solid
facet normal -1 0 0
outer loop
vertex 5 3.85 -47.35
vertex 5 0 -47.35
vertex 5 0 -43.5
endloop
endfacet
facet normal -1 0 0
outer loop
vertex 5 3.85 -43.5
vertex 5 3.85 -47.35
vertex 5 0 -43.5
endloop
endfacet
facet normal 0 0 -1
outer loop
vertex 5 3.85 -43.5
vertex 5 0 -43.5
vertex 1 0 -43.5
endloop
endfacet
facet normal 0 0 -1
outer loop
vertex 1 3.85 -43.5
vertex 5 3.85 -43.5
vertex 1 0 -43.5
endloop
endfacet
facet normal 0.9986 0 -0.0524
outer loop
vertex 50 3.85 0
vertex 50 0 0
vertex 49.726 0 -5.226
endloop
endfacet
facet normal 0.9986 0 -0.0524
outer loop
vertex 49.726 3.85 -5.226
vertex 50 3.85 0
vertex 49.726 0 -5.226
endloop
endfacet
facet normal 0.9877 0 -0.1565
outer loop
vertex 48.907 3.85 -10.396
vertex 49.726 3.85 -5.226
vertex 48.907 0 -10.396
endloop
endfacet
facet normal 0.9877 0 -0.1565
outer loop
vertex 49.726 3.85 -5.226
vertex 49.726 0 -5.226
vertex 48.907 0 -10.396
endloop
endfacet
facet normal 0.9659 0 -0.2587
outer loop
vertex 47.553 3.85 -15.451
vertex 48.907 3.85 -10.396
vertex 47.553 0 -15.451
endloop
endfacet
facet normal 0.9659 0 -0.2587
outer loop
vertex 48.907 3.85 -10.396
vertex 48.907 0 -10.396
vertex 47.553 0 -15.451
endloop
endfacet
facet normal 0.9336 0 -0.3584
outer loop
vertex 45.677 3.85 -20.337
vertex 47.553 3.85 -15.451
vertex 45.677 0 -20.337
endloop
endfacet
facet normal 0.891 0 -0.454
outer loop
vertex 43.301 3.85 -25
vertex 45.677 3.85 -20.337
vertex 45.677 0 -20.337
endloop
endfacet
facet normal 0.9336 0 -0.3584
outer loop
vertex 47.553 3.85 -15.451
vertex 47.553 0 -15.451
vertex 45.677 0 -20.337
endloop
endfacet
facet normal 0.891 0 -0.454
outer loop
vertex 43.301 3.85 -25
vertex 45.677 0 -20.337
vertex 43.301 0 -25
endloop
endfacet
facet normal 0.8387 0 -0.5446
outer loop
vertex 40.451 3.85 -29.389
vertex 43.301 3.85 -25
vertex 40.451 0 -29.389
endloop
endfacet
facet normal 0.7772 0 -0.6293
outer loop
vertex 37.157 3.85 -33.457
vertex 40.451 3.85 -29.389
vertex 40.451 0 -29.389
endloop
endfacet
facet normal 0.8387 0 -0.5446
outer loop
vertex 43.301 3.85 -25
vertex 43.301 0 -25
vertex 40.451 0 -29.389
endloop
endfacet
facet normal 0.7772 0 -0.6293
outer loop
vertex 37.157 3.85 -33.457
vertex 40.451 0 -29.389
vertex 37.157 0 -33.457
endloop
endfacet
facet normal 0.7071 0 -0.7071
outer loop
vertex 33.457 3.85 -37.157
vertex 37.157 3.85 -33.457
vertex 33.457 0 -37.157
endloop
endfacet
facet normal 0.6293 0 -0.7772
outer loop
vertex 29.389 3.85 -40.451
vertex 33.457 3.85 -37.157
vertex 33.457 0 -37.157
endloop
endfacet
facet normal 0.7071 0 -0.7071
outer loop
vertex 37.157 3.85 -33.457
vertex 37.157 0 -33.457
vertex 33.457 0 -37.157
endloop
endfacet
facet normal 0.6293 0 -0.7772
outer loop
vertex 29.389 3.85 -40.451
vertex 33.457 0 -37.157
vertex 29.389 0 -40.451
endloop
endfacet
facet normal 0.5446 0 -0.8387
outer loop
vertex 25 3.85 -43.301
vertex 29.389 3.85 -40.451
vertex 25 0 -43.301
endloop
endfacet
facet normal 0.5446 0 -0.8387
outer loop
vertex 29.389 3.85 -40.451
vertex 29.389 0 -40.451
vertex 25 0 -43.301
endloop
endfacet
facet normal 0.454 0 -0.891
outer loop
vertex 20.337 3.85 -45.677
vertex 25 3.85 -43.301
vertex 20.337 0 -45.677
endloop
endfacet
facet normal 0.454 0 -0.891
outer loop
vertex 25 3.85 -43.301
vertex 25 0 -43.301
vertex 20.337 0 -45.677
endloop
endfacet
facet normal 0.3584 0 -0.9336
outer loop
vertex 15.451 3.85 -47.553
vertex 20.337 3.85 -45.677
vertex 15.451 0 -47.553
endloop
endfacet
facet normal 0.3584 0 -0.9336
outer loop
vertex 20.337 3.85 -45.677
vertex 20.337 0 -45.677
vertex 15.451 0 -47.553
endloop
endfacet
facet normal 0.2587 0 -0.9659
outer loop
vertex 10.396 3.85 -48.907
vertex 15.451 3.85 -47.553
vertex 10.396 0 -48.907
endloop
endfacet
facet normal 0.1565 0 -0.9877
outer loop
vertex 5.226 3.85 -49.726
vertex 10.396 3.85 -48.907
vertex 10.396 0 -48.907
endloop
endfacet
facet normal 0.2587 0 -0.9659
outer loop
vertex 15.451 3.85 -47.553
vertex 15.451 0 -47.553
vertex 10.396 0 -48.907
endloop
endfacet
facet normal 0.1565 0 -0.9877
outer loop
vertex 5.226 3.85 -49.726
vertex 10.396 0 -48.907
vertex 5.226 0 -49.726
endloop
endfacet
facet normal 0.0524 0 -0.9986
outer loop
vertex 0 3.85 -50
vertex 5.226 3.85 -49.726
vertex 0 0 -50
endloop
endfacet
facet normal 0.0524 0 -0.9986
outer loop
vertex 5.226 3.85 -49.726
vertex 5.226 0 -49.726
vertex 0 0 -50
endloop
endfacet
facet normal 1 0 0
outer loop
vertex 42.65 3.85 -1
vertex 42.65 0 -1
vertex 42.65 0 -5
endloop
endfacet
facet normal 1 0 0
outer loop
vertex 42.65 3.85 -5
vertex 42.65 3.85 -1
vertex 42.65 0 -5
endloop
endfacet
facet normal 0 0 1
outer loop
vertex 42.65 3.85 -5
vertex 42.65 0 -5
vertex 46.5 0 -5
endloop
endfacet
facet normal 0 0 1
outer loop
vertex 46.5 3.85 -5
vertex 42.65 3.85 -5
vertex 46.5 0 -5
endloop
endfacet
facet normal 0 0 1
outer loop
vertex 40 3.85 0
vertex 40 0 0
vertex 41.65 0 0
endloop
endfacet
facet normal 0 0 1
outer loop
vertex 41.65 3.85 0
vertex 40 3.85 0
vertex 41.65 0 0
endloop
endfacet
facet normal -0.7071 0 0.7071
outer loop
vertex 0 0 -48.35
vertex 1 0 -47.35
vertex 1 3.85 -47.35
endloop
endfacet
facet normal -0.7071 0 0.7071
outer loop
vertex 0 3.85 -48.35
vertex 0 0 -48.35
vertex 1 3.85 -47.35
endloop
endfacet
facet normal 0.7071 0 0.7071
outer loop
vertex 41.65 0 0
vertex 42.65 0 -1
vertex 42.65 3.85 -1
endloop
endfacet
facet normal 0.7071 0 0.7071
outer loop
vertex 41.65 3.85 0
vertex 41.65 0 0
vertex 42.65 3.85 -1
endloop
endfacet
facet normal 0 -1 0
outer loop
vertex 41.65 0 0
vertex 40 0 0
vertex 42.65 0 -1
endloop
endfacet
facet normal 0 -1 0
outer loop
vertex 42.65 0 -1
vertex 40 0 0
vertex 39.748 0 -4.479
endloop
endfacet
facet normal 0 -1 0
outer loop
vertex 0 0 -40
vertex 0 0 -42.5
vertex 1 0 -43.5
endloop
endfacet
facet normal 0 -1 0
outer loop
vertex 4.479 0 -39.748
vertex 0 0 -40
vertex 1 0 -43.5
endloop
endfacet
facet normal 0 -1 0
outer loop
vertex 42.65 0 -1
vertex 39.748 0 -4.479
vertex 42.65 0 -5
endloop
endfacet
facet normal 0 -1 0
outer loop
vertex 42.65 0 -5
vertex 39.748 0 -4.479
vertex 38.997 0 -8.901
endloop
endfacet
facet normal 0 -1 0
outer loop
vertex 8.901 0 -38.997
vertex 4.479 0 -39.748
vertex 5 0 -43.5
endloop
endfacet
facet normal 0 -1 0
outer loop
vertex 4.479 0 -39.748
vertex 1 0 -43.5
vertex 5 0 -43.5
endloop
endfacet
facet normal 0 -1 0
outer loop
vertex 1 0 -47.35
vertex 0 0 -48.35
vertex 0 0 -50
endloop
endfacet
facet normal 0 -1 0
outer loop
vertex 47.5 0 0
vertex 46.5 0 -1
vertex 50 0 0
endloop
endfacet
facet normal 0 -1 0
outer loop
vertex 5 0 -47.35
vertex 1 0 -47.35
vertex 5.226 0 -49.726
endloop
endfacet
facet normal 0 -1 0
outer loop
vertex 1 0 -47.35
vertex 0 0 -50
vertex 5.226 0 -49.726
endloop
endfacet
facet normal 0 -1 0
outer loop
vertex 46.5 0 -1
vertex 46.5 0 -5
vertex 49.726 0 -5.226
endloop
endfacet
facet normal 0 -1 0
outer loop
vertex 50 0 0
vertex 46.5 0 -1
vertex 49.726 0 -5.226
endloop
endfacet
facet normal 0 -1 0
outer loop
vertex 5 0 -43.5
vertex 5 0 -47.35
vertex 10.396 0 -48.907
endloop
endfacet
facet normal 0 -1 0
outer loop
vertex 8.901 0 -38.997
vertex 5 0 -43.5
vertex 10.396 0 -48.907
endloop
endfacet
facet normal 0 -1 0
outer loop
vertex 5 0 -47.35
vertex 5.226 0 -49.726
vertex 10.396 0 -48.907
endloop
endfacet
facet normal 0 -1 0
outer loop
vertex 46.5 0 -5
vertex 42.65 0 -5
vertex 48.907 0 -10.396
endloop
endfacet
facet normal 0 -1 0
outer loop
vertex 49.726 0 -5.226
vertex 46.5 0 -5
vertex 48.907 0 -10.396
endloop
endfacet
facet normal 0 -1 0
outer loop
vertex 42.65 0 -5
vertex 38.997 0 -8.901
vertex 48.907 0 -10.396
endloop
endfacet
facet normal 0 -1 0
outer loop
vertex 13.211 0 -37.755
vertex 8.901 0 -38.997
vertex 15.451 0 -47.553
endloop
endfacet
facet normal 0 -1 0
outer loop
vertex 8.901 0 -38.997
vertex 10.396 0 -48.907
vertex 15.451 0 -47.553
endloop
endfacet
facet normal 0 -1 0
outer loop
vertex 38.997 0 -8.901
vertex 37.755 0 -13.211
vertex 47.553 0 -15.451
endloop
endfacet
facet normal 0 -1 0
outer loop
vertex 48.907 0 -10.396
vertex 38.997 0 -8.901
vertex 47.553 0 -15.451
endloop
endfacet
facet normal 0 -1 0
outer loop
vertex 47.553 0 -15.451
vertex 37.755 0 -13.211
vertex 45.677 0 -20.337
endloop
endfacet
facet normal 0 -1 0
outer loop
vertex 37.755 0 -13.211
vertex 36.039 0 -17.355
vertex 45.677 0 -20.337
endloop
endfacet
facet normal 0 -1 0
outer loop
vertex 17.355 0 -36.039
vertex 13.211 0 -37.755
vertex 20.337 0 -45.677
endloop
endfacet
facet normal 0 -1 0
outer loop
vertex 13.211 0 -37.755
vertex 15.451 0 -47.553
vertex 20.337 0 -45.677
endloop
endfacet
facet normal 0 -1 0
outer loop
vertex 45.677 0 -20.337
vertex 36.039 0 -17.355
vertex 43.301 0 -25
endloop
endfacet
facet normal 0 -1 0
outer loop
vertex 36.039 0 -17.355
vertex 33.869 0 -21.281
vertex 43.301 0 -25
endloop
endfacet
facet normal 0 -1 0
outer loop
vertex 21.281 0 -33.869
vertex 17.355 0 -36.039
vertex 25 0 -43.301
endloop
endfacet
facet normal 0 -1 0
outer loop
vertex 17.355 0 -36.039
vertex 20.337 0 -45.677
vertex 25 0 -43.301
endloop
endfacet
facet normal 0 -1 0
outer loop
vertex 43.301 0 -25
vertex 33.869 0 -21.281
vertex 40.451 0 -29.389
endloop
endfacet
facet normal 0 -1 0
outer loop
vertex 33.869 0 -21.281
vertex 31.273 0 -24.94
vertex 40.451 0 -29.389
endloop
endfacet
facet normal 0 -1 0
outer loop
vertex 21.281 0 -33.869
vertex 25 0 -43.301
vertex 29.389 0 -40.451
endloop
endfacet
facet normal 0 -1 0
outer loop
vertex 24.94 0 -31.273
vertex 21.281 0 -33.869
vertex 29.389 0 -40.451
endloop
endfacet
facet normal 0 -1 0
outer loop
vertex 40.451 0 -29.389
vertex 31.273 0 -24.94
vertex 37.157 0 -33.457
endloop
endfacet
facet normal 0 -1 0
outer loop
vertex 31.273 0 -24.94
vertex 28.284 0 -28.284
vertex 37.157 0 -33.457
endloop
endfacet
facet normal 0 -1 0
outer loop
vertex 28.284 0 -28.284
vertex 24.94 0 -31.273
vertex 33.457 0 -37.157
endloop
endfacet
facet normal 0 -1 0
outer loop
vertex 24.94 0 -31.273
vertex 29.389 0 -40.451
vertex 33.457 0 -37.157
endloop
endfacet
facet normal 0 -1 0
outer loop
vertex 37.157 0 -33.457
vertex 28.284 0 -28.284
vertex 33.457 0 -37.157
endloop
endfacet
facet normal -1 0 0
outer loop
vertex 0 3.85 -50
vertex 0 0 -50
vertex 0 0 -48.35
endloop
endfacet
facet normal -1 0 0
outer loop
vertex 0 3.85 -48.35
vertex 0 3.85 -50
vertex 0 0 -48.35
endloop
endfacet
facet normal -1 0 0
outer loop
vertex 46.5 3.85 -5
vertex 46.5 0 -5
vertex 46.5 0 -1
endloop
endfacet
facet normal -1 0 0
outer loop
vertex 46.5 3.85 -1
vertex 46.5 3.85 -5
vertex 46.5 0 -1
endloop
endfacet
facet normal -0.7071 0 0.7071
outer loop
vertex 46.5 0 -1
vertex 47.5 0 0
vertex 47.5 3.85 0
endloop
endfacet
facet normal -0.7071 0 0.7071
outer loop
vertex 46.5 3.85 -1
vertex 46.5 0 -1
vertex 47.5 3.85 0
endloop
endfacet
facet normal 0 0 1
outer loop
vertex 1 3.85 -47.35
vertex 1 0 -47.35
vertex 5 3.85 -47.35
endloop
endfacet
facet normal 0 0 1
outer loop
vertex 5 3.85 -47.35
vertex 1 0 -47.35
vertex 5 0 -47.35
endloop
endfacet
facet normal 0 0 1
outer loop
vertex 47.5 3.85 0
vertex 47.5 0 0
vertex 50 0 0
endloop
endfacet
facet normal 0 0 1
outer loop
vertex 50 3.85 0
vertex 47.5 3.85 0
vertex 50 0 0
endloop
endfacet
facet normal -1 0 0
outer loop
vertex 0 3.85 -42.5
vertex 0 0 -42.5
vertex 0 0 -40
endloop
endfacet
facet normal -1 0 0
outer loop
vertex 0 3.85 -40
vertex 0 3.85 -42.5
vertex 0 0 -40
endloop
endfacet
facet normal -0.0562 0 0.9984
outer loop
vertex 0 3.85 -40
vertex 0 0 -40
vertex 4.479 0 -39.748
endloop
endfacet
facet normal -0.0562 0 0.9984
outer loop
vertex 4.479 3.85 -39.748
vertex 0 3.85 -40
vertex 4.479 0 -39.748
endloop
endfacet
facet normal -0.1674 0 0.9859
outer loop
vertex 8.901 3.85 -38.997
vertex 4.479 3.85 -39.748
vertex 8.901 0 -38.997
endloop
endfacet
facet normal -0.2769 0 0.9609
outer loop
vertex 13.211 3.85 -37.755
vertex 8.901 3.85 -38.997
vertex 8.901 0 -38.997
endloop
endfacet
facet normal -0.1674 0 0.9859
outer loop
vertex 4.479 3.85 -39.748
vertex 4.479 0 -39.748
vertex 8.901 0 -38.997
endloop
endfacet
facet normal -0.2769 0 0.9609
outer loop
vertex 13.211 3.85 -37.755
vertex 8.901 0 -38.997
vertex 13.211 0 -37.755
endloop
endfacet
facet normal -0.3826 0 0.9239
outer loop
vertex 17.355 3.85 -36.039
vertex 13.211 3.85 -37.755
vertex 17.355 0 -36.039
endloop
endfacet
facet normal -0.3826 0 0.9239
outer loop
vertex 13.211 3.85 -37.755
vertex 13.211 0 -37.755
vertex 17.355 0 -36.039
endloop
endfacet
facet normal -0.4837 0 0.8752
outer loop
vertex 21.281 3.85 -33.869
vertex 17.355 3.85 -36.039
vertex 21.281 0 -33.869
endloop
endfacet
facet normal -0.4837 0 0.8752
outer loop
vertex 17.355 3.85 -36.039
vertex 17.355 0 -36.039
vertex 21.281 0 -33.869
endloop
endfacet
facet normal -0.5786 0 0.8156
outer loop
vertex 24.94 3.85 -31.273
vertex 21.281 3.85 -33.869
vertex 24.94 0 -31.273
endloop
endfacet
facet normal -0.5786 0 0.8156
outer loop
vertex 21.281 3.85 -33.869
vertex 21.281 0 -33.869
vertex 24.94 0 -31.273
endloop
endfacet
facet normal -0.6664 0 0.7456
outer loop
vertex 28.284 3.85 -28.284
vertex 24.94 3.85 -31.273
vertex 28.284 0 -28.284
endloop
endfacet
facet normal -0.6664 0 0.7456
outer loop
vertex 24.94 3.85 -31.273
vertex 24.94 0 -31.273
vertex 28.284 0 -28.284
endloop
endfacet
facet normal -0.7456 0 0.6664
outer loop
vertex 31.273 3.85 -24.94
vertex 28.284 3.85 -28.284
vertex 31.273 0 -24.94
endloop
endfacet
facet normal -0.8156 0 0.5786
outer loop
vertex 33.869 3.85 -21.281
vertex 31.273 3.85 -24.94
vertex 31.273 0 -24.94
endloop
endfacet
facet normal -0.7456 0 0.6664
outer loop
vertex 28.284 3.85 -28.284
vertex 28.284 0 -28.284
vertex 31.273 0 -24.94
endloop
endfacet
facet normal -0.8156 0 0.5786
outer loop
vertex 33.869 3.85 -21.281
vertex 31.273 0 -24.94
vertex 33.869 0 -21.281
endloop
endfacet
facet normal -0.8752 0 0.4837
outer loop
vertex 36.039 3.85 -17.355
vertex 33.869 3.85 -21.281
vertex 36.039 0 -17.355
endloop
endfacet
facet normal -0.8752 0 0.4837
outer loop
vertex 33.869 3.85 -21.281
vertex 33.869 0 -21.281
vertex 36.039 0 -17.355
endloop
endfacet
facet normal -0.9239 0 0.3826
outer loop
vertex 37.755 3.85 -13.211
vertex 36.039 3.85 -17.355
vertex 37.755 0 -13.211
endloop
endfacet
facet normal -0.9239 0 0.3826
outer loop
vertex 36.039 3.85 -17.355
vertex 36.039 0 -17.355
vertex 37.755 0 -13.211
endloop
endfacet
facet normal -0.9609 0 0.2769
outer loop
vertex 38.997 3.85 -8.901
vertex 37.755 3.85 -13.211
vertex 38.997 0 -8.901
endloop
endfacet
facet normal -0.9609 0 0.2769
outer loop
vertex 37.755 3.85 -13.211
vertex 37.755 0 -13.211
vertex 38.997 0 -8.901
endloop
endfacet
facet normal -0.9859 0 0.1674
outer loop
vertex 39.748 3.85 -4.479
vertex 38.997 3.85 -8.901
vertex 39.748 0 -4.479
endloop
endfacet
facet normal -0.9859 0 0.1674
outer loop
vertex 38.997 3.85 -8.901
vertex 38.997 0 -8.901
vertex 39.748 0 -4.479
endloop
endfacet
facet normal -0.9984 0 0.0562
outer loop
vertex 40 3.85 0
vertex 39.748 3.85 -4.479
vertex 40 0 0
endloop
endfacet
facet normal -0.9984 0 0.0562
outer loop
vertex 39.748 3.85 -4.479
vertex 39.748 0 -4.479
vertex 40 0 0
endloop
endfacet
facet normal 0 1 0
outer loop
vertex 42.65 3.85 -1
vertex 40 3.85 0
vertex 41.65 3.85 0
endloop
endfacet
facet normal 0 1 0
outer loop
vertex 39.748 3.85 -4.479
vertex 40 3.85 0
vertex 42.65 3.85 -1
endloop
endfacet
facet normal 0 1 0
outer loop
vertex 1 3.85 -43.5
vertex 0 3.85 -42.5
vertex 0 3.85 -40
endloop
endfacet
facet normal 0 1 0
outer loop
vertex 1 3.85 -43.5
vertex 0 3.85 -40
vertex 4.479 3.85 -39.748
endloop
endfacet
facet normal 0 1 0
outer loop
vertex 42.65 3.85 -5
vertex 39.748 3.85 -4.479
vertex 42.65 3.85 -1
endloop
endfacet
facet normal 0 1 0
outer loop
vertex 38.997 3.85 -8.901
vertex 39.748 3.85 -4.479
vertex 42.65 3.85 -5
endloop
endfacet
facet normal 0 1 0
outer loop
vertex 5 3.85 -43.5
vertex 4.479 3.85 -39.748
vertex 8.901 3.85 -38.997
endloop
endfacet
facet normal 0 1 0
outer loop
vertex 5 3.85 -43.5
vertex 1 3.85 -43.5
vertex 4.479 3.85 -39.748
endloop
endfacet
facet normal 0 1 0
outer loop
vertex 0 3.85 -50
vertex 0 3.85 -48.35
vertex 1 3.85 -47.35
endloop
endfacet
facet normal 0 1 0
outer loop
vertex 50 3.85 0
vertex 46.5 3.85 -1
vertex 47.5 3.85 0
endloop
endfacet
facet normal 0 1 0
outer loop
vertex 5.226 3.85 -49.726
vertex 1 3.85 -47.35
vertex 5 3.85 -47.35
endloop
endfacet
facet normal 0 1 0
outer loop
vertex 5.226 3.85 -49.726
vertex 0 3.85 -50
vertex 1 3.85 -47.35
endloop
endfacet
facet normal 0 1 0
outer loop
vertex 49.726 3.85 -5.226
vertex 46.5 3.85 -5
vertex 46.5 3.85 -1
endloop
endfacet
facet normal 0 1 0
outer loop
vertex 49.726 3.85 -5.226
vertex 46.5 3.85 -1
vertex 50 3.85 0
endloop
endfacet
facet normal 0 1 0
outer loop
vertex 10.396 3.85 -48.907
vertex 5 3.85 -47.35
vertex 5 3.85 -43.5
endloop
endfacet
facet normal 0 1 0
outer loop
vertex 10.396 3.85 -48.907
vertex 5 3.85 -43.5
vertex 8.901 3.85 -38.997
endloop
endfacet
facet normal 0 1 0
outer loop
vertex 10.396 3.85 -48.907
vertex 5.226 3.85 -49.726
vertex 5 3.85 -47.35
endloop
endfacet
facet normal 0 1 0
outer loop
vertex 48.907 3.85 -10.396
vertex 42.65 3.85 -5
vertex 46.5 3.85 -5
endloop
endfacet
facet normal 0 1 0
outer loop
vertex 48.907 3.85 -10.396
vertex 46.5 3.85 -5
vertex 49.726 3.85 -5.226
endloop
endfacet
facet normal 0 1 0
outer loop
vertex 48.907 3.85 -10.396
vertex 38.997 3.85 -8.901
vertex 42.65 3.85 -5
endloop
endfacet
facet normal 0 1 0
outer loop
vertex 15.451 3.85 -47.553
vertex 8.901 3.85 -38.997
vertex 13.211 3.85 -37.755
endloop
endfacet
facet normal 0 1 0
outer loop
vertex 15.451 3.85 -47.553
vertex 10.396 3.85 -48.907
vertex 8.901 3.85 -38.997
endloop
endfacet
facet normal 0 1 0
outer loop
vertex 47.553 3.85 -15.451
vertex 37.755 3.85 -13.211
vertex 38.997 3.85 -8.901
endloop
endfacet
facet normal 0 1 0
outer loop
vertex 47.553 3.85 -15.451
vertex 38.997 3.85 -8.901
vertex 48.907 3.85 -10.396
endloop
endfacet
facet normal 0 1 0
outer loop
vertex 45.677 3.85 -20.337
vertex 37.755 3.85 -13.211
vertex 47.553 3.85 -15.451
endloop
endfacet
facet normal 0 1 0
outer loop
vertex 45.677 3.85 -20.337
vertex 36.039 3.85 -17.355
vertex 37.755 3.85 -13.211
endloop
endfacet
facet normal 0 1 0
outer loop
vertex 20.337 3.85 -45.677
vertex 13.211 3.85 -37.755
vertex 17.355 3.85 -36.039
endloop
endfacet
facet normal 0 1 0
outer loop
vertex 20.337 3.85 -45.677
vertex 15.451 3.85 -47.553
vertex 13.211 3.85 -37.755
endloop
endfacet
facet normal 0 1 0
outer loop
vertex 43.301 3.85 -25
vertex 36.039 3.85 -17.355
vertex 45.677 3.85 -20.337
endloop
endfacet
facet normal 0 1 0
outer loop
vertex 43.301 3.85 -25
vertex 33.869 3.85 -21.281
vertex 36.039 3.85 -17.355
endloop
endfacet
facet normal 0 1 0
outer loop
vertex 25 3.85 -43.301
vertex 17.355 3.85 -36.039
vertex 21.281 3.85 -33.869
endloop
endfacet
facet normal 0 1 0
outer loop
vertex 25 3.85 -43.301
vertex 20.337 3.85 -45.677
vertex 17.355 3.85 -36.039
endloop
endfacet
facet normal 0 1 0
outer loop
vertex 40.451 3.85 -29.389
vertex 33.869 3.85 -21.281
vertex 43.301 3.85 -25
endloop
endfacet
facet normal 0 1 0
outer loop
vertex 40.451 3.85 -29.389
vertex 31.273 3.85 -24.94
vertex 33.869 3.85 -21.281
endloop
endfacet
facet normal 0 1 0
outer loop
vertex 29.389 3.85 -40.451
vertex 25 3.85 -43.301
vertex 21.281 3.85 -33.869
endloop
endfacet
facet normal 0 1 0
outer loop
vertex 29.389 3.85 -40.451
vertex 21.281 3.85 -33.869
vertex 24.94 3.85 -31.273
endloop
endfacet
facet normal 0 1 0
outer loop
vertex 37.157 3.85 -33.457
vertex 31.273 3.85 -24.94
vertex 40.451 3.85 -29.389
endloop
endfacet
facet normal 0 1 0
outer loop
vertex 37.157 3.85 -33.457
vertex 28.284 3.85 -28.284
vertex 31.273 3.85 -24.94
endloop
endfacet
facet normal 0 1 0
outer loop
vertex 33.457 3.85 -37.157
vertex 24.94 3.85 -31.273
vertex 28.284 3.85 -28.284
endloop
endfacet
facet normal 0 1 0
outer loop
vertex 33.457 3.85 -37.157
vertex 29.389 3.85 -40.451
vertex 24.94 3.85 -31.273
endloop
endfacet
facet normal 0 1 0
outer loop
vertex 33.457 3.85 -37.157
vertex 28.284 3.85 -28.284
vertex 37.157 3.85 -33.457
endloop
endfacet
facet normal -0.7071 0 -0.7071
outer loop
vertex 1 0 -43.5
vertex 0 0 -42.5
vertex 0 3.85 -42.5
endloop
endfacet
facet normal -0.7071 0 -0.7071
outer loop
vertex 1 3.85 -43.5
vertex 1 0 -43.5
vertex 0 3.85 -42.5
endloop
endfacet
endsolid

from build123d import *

# Parameters (mm, degrees)
BOSS_EXTRUDE1_DEPTH = 3.85
CHAMFER1_SIZE       = 1


with BuildPart() as part:
    # Sketch1 → Boss-Extrude1 (new body)
    with BuildSketch(Plane(origin=(0, 0, 0), x_dir=(1, 0, 0), z_dir=(0, 1, 0))):
        with BuildLine():
            Line((0, 50), (0, 47.35))
            Line((0, 47.35), (5, 47.35))
            Line((5, 47.35), (5, 43.5))
            Line((5, 43.5), (0, 43.5))
            Line((0, 43.5), (0, 40))
            ThreePointArc((0, 40), (28.284271247, 28.284271247), (40, 0))
            Line((40, 0), (42.65, 0))
            Line((42.65, 0), (42.65, 5))
            Line((42.65, 5), (46.5, 5))
            Line((46.5, 5), (46.5, 0))
            Line((46.5, 0), (50, 0))
            ThreePointArc((50, 0), (35.355339059, 35.355339059), (0, 50))
        make_face()
    extrude(amount=BOSS_EXTRUDE1_DEPTH)

    # Chamfer1
    chamfer1_edges = [part.edges().sort_by_distance(p)[0] for p in [
        (0, 1.925, -43.5),
        (0, 1.925, -47.35),
        (46.5, 1.925, 0),
        (42.65, 1.925, 0),
    ]]
    chamfer(chamfer1_edges, length=CHAMFER1_SIZE)


solid = part.part
